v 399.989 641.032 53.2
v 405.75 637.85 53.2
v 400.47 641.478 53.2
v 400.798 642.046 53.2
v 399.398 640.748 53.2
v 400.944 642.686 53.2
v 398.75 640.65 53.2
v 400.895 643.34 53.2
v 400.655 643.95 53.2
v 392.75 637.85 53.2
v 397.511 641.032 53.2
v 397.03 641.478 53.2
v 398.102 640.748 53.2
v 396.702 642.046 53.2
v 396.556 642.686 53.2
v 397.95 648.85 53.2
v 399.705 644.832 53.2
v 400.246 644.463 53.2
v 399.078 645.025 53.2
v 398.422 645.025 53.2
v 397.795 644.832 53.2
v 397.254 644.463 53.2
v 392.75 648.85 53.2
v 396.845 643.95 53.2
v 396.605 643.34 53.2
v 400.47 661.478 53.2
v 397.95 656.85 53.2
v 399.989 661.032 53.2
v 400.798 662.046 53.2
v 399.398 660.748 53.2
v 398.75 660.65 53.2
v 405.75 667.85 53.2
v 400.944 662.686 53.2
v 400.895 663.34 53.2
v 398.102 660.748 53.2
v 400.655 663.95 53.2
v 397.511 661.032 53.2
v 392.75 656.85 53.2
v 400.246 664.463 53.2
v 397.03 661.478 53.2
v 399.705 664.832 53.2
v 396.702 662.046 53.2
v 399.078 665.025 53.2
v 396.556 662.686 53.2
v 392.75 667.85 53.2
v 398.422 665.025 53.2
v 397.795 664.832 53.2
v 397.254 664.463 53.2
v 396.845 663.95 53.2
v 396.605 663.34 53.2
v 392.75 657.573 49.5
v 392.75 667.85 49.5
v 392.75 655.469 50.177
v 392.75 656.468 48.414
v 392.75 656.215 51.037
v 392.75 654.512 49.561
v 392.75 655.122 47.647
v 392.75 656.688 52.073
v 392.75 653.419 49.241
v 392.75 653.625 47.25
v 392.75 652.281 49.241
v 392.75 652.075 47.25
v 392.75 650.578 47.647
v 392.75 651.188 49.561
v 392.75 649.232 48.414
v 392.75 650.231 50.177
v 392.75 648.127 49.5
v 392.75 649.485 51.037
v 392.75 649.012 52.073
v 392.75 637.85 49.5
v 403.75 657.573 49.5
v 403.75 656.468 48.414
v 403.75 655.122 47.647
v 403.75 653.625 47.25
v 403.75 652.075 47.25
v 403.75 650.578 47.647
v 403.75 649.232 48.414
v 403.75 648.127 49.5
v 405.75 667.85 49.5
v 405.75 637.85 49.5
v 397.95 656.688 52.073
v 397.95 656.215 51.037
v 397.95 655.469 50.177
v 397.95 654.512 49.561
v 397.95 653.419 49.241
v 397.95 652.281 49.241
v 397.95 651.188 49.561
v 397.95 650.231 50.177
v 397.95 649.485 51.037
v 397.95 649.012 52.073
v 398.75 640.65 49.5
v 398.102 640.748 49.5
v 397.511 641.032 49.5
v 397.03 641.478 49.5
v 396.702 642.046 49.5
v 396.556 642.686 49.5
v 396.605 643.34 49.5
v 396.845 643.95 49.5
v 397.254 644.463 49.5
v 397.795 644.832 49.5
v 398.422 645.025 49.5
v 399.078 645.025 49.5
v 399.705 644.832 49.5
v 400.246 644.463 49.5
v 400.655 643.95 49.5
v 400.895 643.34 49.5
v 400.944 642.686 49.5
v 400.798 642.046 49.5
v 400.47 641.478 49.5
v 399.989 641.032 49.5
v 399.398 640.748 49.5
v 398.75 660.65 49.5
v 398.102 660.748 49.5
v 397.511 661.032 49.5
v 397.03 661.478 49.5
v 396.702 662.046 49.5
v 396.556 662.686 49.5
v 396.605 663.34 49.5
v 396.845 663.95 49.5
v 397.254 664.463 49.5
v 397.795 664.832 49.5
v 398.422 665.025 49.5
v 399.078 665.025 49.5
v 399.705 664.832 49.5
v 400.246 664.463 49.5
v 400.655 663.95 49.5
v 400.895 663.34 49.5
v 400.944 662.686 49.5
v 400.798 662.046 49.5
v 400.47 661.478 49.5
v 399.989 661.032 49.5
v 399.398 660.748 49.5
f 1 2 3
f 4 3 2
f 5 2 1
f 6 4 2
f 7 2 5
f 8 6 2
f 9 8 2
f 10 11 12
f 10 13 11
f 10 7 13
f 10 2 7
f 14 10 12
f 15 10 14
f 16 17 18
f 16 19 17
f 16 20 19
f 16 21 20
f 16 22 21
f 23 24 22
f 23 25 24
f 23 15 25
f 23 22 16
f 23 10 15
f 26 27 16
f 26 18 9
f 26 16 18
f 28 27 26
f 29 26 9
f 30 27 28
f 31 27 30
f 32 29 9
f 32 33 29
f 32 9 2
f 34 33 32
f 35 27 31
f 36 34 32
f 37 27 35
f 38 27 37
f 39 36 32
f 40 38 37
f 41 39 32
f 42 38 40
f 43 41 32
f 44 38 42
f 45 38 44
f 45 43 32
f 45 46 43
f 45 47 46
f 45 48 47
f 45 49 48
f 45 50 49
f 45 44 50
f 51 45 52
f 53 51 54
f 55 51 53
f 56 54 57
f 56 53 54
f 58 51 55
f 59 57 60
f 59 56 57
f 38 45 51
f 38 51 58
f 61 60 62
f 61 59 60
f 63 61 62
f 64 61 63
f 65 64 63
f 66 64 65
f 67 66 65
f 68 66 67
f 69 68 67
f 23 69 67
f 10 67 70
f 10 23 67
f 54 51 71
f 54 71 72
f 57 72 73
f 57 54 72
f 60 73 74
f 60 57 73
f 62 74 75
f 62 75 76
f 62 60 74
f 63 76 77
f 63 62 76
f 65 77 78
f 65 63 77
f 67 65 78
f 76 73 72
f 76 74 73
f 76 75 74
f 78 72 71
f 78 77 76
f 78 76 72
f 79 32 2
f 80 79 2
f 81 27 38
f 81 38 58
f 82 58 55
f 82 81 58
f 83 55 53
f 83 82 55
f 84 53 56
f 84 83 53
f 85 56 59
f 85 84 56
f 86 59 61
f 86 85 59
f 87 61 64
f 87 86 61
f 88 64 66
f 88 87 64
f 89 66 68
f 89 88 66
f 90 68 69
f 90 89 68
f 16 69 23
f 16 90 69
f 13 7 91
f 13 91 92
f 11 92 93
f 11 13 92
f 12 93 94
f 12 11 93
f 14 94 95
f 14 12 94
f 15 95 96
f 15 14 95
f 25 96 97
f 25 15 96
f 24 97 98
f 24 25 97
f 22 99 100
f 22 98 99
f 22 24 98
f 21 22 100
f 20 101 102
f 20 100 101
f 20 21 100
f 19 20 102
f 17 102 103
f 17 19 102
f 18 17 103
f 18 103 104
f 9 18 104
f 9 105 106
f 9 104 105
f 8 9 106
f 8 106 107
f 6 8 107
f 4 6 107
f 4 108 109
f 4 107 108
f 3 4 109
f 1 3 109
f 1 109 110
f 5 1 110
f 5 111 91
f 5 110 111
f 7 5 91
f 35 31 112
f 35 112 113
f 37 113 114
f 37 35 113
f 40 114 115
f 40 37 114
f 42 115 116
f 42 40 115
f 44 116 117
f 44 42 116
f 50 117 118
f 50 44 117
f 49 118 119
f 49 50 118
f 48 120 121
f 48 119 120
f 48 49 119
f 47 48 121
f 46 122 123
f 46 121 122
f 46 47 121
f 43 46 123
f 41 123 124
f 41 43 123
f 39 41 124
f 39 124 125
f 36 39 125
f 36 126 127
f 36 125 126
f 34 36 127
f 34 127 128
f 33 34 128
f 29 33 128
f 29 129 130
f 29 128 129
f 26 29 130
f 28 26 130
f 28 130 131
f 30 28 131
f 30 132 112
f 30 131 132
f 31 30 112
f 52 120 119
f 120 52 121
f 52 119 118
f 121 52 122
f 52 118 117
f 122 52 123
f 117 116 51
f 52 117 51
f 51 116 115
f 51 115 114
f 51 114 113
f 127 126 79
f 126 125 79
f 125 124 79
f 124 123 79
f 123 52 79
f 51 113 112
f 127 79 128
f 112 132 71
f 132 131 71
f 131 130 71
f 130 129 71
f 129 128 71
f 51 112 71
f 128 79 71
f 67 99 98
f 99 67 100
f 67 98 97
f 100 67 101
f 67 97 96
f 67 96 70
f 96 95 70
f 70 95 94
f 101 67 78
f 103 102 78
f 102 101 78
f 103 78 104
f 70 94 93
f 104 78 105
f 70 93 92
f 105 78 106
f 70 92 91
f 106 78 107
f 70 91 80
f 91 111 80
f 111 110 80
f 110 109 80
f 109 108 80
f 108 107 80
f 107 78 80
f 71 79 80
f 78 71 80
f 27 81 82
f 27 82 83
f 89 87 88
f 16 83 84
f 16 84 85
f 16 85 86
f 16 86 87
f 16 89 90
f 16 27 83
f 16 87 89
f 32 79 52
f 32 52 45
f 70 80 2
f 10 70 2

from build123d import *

# Parameters (mm, degrees)
CYLINDER073_R          = 2.2
CYLINDER073_DEPTH      = 20
CYLINDER074_R          = 2.2
CYLINDER074_DEPTH      = 20
CYLINDER072_R          = 4
CYLINDER072_DEPTH      = 6.5
CYLINDER071_W          = 6
CYLINDER071_H          = 11
CYLINDER071_ANGLE      = 180
BOX054_W               = 30
BOX054_H               = 3.7
BOX054_DEPTH           = 13
CUT090_ROLL_ANGLE      = 90
CUT090_PLACEMENT_ANGLE = -90


with BuildPart() as zylinder062:
    # Cylinder073 → Cylinder073 (new body)
    with BuildSketch(Plane(origin=(-10, 9, 5), x_dir=(1, 0, 0), z_dir=(0, -1, 0))):
        Circle(CYLINDER073_R)
    extrude(amount=CYLINDER073_DEPTH)


with BuildPart() as zylinder063:
    # Cylinder074 → Cylinder074 (new body)
    with BuildSketch(Plane(origin=(10, 9, 5), x_dir=(1, 0, 0), z_dir=(0, -1, 0))):
        Circle(CYLINDER074_R)
    extrude(amount=CYLINDER074_DEPTH)


with BuildPart() as zylinder061:
    # Cylinder072 → Cylinder072 (new body)
    with BuildSketch(Plane.XY.offset(5.8)):
        Circle(CYLINDER072_R)
    extrude(amount=CYLINDER072_DEPTH)


with BuildPart() as zylinder060:
    # Cylinder071 → Cylinder071 (revolve)
    with BuildSketch(Plane(origin=(0, 0, 0), x_dir=(-1, 0, 0), z_dir=(0, 1, 0))):
        with Locations((3, 5.5)):
            Rectangle(CYLINDER071_W, CYLINDER071_H)
    revolve(axis=Axis((0, 0, 0), (0, 0, 1)), revolution_arc=CYLINDER071_ANGLE)


with BuildPart() as y_drive_mount_top004:
    # Box054 → Box054 (new body)
    with BuildSketch(Plane(origin=(-15, -3.7, -2), x_dir=(1, 0, 0), z_dir=(0, 0, 1))):
        with Locations((15, 1.85)):
            Rectangle(BOX054_W, BOX054_H)
    extrude(amount=BOX054_DEPTH)

    # Fusion041: union Zylinder060
    add(zylinder060.part)

    # Cut081: cut Zylinder061
    add(zylinder061.part, mode=Mode.SUBTRACT)

    # Cut082: cut Zylinder063
    add(zylinder063.part, mode=Mode.SUBTRACT)

    # Cut090: cut Zylinder062
    add(zylinder062.part, mode=Mode.SUBTRACT)


with BuildPart() as y_drive_mount_top004_1:
    # Cut090 roll: moved
    add(y_drive_mount_top004.part.rotate(Axis((0, 0, 0), (1, 0, 0)), CUT090_ROLL_ANGLE))


with BuildPart() as y_drive_mount_top004_2:
    # Cut090 placement: moved
    add(y_drive_mount_top004_1.part.moved(Location((403.75, 652.85, 53.2))).rotate(Axis((403.75, 652.85, 53.2), (0, 0, 1)), CUT090_PLACEMENT_ANGLE))


solid = y_drive_mount_top004_2.part
